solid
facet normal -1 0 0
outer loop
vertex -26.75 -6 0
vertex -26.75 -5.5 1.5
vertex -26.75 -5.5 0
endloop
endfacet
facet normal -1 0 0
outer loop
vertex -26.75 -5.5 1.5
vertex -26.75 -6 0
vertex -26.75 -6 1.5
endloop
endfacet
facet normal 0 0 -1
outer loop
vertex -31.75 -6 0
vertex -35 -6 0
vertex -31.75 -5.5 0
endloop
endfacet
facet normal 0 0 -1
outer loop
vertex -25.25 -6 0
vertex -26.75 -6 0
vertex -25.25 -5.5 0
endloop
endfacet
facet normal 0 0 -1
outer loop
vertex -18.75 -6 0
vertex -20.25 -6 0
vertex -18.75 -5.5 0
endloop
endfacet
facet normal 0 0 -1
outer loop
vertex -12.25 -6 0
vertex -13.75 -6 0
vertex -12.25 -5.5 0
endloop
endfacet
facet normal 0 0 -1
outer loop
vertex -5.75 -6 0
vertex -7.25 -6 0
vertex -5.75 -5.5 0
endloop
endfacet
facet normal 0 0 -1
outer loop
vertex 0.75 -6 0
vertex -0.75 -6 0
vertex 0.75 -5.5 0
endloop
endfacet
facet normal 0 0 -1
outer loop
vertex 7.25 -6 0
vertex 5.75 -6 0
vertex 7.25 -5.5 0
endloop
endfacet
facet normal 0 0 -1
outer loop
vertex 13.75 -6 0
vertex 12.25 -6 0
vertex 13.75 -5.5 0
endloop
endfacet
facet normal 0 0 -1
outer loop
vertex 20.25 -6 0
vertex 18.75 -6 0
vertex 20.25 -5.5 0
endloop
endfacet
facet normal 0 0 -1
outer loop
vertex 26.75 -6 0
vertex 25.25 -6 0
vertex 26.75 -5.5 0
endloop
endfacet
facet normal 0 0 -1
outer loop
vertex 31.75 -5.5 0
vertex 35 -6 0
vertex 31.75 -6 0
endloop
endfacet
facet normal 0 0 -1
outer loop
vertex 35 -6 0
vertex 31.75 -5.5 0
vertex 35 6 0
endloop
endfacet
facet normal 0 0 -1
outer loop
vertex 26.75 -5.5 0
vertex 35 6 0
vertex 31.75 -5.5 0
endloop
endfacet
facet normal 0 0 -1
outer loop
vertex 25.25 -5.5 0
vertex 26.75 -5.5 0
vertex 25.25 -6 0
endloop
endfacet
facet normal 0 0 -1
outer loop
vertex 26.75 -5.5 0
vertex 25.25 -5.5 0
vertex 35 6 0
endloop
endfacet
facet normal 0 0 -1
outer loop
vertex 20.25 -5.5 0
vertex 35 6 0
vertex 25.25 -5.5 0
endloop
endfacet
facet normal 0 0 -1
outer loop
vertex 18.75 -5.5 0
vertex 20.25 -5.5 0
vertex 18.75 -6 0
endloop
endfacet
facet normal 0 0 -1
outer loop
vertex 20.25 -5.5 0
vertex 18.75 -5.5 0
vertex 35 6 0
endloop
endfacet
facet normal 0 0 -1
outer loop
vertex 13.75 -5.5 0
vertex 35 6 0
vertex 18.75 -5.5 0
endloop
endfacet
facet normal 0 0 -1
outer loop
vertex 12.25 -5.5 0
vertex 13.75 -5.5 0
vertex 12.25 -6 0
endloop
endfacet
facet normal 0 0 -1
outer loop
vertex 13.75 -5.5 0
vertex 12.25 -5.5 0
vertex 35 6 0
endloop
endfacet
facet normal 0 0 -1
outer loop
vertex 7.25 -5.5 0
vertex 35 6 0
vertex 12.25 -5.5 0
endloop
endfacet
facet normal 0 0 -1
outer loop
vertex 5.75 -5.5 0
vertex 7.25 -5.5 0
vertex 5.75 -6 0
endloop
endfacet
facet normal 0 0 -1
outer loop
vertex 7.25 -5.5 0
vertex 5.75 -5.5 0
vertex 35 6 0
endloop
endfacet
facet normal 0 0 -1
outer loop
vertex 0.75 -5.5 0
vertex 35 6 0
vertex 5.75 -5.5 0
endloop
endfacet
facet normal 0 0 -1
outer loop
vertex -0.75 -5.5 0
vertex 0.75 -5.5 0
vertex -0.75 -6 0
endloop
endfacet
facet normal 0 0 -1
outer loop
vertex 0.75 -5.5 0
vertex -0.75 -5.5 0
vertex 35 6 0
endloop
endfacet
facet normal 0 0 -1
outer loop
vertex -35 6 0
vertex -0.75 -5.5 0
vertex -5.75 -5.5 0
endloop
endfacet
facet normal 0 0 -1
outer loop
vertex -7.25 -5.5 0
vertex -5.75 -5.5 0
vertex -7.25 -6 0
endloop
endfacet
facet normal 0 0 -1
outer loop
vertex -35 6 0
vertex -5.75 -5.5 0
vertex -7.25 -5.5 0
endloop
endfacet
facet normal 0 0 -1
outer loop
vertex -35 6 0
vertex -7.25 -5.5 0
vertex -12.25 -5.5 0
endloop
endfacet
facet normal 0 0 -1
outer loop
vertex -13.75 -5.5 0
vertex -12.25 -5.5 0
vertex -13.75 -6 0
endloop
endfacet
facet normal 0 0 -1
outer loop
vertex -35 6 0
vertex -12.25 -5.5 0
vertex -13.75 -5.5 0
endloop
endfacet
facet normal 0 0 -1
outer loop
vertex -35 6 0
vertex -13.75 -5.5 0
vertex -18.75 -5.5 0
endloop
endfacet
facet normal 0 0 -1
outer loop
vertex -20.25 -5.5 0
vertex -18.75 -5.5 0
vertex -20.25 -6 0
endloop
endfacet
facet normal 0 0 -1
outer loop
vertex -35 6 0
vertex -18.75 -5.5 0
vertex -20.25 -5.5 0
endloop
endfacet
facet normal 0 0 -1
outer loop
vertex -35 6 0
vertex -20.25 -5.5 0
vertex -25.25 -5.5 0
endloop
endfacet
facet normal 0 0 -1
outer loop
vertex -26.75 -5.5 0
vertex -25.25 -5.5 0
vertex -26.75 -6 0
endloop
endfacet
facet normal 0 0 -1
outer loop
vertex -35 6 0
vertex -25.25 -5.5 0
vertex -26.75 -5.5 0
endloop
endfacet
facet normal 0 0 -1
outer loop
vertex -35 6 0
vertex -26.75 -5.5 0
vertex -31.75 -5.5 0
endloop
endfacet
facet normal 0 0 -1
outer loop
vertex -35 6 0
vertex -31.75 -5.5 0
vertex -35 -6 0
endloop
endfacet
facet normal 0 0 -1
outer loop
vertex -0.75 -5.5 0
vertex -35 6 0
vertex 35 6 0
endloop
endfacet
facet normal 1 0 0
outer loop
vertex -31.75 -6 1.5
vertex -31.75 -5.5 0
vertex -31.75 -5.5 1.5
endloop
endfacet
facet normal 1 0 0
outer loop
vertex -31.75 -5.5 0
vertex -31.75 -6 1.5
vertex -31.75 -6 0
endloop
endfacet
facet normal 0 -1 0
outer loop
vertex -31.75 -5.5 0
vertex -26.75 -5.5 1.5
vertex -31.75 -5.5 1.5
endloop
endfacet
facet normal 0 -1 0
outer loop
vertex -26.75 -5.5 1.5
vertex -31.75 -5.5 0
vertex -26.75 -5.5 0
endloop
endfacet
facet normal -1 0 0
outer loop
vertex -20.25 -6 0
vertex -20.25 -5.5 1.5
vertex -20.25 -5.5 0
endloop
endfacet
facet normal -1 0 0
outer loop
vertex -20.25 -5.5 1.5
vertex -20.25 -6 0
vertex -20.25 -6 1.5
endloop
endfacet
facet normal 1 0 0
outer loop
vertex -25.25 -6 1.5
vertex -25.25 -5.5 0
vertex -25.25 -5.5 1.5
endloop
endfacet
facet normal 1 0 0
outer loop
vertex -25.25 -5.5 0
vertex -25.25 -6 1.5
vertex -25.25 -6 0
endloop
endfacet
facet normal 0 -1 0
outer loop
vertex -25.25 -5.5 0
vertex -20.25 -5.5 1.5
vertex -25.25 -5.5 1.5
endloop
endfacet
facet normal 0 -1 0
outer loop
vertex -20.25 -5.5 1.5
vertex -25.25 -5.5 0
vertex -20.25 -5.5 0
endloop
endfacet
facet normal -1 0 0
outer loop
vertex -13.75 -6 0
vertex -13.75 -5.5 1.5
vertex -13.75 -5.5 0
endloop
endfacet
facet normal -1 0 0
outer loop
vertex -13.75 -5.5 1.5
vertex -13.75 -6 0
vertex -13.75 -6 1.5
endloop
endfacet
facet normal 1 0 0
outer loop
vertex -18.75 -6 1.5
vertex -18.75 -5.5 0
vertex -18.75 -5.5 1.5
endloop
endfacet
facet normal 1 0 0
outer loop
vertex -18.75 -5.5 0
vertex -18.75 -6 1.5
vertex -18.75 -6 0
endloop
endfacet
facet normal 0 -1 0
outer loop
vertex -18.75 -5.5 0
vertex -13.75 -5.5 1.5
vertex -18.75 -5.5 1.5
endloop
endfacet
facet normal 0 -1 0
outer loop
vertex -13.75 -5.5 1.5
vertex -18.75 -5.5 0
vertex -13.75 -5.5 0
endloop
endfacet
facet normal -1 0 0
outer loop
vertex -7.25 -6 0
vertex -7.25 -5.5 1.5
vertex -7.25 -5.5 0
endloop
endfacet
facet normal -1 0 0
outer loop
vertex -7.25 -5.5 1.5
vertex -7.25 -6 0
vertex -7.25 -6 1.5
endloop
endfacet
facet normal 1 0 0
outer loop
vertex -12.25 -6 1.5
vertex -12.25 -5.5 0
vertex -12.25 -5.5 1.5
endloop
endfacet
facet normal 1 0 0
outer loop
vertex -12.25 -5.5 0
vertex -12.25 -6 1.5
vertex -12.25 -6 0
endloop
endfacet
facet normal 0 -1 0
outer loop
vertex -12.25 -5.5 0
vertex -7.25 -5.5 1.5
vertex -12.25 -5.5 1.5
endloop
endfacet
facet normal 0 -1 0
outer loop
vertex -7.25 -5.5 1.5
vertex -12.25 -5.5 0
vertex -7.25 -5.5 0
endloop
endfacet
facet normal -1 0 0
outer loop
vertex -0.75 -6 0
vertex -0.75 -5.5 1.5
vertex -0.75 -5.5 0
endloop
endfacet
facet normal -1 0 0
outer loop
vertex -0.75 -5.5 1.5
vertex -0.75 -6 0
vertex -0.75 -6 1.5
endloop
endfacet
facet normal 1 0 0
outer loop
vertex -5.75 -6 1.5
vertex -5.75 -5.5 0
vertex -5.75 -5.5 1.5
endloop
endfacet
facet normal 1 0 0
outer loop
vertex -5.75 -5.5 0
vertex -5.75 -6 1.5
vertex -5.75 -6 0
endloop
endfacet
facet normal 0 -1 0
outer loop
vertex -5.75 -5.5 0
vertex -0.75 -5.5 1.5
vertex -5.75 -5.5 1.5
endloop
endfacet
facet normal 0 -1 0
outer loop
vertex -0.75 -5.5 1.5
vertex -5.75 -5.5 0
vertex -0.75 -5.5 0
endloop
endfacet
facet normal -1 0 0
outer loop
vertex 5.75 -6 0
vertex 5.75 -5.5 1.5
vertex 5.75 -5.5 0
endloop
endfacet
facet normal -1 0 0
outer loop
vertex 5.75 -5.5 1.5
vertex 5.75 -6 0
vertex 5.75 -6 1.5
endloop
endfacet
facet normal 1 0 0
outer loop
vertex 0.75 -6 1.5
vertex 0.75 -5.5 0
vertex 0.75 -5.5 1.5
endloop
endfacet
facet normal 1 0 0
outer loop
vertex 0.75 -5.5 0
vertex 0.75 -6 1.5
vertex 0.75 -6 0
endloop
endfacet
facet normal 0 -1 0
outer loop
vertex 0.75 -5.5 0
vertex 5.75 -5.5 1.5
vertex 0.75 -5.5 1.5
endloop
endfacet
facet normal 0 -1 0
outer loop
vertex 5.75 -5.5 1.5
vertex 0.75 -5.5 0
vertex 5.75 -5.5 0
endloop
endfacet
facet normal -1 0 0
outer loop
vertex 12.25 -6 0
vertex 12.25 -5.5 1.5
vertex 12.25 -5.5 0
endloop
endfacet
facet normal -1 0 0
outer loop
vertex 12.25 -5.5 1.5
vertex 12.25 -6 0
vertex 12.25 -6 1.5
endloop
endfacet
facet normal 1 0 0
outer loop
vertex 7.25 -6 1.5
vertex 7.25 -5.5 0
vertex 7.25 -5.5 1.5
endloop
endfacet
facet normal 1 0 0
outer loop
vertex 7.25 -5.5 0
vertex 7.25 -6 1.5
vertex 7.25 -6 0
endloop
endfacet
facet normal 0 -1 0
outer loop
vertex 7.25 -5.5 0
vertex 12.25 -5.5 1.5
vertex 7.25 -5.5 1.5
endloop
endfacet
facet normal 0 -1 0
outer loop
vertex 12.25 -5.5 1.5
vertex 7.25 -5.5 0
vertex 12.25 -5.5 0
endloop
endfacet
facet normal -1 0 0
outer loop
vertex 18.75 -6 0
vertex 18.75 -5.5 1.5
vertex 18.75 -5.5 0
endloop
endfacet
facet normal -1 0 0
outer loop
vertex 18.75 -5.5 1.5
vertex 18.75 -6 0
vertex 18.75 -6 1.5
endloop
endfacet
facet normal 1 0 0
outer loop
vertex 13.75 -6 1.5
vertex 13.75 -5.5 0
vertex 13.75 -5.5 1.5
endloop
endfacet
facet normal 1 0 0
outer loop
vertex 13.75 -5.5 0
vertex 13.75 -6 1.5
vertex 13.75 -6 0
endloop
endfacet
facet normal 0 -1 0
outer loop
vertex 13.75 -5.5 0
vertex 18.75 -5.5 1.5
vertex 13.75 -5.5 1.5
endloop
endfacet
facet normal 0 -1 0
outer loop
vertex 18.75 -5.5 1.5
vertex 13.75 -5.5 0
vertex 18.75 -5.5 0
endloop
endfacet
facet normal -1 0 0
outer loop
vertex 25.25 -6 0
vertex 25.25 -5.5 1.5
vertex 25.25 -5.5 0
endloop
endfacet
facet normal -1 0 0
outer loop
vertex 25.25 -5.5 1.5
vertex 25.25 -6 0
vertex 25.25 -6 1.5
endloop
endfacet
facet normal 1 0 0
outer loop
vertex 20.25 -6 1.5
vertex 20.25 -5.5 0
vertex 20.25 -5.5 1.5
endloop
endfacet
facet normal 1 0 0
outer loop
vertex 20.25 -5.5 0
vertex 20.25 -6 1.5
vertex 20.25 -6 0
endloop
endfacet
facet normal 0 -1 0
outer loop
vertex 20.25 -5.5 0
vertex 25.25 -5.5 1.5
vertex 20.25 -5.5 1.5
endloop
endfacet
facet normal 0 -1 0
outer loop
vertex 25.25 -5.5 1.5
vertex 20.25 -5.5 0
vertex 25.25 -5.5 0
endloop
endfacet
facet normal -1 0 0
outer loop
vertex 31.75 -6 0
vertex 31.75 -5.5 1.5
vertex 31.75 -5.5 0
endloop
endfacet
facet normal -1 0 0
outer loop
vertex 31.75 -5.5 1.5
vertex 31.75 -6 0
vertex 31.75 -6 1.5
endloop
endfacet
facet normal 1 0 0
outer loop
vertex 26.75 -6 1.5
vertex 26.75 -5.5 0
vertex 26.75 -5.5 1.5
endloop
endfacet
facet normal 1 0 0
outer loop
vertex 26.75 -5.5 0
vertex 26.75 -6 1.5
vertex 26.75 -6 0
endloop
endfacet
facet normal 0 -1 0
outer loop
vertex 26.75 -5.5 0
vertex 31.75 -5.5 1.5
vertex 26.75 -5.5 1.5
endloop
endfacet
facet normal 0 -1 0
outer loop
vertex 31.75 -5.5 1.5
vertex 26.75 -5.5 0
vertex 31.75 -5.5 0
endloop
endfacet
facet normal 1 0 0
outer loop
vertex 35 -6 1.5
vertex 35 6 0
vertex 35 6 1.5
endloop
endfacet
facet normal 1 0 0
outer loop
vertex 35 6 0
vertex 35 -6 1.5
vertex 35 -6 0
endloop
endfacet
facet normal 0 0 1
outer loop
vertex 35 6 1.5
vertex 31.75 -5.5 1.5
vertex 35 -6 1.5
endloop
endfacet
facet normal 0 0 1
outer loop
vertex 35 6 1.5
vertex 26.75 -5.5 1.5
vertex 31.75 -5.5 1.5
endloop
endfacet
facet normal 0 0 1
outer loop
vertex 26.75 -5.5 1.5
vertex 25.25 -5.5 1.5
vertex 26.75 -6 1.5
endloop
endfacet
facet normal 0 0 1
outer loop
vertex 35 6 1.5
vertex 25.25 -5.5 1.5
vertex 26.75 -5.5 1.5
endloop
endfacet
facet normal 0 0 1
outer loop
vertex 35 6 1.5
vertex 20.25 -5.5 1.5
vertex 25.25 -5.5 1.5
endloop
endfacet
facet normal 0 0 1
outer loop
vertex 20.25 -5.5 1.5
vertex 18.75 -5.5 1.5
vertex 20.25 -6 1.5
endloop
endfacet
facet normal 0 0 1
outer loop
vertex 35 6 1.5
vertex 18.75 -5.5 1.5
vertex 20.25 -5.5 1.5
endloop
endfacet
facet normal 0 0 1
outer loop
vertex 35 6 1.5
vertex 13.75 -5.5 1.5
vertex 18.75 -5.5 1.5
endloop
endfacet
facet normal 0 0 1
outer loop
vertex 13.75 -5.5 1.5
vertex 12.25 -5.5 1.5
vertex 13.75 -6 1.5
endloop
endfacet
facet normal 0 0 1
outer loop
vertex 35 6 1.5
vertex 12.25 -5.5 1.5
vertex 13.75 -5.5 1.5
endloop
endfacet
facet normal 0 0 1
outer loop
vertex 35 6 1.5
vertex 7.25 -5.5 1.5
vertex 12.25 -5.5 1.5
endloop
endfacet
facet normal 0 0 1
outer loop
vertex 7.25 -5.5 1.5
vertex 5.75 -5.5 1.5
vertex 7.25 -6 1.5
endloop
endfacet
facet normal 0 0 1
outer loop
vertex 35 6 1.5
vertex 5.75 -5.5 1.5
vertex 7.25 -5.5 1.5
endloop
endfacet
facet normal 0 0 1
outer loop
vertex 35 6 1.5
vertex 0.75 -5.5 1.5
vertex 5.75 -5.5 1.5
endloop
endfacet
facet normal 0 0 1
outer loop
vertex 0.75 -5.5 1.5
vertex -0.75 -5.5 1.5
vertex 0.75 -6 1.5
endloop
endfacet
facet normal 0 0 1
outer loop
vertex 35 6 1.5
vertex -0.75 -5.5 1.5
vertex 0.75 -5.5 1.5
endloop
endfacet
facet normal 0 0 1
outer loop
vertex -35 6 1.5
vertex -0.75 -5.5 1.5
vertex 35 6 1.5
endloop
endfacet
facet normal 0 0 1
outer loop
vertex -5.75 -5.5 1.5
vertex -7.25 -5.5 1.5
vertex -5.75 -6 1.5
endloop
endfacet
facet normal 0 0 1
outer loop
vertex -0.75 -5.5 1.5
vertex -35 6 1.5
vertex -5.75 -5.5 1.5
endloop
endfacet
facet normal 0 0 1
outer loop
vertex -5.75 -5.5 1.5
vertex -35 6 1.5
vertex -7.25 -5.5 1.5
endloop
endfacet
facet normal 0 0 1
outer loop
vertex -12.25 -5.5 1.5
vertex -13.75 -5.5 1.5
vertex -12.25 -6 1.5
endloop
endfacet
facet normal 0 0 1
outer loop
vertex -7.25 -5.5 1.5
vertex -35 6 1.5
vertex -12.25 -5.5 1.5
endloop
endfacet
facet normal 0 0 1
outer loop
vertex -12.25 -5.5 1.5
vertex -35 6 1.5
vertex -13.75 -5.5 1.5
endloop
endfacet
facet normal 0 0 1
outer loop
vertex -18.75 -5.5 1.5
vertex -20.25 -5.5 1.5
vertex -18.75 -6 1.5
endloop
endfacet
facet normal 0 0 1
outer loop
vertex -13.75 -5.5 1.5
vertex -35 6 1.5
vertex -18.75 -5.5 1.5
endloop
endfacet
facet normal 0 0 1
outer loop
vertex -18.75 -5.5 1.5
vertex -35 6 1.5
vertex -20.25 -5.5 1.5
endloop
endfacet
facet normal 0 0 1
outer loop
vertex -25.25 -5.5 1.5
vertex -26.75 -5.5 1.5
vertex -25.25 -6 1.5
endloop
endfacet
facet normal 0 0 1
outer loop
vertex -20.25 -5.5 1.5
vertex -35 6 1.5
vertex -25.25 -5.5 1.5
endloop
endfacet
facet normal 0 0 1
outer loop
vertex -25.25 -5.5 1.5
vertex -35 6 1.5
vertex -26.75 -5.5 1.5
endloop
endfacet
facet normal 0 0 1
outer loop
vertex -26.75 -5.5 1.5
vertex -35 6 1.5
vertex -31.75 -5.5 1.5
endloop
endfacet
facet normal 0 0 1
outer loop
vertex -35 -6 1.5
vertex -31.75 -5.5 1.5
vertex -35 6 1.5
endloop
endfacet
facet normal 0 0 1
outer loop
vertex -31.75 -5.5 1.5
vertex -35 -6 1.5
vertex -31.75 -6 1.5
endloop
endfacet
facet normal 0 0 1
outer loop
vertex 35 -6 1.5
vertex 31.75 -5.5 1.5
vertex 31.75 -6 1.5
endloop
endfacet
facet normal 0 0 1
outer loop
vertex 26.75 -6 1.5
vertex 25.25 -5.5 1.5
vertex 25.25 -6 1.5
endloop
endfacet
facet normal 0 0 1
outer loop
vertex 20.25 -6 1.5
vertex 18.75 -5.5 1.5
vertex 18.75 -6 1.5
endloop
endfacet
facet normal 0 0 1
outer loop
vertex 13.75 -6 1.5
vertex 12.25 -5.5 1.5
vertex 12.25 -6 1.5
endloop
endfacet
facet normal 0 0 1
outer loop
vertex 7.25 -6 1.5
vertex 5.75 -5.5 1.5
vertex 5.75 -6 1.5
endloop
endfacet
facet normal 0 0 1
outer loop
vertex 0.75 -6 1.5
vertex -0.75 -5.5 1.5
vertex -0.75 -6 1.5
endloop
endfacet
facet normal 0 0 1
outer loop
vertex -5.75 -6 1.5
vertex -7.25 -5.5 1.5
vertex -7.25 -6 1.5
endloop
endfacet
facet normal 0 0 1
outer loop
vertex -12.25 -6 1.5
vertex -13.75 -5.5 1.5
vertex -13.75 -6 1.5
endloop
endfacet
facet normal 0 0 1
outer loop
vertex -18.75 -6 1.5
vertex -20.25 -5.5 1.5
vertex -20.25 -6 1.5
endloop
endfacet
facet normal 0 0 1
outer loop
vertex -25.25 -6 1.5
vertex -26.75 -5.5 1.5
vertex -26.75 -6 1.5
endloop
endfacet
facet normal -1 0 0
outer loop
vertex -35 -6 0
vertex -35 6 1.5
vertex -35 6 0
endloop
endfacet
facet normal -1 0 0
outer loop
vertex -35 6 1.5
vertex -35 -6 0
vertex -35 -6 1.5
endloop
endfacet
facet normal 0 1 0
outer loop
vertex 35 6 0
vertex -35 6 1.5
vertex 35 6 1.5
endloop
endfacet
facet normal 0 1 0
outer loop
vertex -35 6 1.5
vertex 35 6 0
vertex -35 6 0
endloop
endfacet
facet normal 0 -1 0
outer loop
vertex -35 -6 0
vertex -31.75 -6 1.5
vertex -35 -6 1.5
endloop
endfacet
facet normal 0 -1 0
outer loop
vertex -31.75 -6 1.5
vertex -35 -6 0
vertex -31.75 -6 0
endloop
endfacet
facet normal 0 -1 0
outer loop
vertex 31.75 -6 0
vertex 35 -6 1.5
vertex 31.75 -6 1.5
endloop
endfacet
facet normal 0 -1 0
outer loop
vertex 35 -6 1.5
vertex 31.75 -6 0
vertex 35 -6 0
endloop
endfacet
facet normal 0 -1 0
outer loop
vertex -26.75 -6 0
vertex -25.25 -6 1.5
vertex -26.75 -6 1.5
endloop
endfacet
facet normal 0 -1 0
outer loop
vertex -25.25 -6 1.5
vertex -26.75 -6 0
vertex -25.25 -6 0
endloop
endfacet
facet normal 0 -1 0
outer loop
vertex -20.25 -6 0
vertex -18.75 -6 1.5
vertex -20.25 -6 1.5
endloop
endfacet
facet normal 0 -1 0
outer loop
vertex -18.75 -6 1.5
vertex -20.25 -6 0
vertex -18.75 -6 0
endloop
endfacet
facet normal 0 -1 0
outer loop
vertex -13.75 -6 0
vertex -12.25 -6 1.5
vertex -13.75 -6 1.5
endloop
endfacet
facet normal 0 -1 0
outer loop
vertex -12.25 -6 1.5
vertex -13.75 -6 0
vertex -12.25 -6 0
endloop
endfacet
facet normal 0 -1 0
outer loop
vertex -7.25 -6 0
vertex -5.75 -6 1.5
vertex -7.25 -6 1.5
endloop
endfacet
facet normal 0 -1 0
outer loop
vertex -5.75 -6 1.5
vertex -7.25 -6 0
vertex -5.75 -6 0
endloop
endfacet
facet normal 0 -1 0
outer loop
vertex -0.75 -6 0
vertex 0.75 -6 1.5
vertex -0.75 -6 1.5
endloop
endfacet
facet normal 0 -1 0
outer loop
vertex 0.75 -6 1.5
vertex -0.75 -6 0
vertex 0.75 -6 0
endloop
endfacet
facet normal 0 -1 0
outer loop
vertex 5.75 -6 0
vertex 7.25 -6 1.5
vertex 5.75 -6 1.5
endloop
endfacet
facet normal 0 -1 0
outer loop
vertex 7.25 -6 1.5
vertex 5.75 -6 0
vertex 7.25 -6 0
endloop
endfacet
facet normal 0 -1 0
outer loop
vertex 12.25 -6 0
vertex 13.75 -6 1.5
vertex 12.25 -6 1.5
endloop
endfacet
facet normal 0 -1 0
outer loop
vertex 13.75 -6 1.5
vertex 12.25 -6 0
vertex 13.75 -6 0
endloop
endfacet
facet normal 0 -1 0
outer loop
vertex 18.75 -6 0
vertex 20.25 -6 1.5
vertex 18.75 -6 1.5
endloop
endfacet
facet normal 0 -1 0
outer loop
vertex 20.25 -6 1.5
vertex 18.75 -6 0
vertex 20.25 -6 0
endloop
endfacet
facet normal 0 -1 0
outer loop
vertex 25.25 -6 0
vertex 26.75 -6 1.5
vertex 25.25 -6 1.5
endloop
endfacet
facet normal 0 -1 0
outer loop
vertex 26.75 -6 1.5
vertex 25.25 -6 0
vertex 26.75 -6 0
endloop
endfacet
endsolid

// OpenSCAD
// 10-well comb for agarose gel casting, printed lying flat
// Units: mm

// ---- Spine ----
spine_len   = 70;   // spine length along X
spine_wid   = 12;   // spine width along Y
plate_thk   = 1.5;  // plate thickness along Z

// ---- Teeth ----
tooth_count = 10;   // number of teeth
tooth_w     = 5.0;  // tooth width along X
tooth_len   = 12;   // tooth length along Y (overlaps spine)
gap         = 1.5;  // gap between neighbouring teeth

// ---- Misc ----
eps         = 0.5;  // cutter overshoot past faces
$fn         = 64;

// Derived
pitch   = tooth_w + gap;
x_start = -(tooth_count - 1) * pitch / 2;  // first tooth centre, row centred

difference() {
    // Base plate
    translate([-spine_len / 2, -spine_wid / 2, 0])
        cube([spine_len, spine_wid, plate_thk]);

    // Teeth hanging in -Y
    for (i = [0 : tooth_count - 1]) {
        translate([x_start + i * pitch - tooth_w / 2,
                   -spine_wid / 2 - tooth_len,
                   0])
            cube([tooth_w, tooth_len + eps, plate_thk + eps]);
    }
}
